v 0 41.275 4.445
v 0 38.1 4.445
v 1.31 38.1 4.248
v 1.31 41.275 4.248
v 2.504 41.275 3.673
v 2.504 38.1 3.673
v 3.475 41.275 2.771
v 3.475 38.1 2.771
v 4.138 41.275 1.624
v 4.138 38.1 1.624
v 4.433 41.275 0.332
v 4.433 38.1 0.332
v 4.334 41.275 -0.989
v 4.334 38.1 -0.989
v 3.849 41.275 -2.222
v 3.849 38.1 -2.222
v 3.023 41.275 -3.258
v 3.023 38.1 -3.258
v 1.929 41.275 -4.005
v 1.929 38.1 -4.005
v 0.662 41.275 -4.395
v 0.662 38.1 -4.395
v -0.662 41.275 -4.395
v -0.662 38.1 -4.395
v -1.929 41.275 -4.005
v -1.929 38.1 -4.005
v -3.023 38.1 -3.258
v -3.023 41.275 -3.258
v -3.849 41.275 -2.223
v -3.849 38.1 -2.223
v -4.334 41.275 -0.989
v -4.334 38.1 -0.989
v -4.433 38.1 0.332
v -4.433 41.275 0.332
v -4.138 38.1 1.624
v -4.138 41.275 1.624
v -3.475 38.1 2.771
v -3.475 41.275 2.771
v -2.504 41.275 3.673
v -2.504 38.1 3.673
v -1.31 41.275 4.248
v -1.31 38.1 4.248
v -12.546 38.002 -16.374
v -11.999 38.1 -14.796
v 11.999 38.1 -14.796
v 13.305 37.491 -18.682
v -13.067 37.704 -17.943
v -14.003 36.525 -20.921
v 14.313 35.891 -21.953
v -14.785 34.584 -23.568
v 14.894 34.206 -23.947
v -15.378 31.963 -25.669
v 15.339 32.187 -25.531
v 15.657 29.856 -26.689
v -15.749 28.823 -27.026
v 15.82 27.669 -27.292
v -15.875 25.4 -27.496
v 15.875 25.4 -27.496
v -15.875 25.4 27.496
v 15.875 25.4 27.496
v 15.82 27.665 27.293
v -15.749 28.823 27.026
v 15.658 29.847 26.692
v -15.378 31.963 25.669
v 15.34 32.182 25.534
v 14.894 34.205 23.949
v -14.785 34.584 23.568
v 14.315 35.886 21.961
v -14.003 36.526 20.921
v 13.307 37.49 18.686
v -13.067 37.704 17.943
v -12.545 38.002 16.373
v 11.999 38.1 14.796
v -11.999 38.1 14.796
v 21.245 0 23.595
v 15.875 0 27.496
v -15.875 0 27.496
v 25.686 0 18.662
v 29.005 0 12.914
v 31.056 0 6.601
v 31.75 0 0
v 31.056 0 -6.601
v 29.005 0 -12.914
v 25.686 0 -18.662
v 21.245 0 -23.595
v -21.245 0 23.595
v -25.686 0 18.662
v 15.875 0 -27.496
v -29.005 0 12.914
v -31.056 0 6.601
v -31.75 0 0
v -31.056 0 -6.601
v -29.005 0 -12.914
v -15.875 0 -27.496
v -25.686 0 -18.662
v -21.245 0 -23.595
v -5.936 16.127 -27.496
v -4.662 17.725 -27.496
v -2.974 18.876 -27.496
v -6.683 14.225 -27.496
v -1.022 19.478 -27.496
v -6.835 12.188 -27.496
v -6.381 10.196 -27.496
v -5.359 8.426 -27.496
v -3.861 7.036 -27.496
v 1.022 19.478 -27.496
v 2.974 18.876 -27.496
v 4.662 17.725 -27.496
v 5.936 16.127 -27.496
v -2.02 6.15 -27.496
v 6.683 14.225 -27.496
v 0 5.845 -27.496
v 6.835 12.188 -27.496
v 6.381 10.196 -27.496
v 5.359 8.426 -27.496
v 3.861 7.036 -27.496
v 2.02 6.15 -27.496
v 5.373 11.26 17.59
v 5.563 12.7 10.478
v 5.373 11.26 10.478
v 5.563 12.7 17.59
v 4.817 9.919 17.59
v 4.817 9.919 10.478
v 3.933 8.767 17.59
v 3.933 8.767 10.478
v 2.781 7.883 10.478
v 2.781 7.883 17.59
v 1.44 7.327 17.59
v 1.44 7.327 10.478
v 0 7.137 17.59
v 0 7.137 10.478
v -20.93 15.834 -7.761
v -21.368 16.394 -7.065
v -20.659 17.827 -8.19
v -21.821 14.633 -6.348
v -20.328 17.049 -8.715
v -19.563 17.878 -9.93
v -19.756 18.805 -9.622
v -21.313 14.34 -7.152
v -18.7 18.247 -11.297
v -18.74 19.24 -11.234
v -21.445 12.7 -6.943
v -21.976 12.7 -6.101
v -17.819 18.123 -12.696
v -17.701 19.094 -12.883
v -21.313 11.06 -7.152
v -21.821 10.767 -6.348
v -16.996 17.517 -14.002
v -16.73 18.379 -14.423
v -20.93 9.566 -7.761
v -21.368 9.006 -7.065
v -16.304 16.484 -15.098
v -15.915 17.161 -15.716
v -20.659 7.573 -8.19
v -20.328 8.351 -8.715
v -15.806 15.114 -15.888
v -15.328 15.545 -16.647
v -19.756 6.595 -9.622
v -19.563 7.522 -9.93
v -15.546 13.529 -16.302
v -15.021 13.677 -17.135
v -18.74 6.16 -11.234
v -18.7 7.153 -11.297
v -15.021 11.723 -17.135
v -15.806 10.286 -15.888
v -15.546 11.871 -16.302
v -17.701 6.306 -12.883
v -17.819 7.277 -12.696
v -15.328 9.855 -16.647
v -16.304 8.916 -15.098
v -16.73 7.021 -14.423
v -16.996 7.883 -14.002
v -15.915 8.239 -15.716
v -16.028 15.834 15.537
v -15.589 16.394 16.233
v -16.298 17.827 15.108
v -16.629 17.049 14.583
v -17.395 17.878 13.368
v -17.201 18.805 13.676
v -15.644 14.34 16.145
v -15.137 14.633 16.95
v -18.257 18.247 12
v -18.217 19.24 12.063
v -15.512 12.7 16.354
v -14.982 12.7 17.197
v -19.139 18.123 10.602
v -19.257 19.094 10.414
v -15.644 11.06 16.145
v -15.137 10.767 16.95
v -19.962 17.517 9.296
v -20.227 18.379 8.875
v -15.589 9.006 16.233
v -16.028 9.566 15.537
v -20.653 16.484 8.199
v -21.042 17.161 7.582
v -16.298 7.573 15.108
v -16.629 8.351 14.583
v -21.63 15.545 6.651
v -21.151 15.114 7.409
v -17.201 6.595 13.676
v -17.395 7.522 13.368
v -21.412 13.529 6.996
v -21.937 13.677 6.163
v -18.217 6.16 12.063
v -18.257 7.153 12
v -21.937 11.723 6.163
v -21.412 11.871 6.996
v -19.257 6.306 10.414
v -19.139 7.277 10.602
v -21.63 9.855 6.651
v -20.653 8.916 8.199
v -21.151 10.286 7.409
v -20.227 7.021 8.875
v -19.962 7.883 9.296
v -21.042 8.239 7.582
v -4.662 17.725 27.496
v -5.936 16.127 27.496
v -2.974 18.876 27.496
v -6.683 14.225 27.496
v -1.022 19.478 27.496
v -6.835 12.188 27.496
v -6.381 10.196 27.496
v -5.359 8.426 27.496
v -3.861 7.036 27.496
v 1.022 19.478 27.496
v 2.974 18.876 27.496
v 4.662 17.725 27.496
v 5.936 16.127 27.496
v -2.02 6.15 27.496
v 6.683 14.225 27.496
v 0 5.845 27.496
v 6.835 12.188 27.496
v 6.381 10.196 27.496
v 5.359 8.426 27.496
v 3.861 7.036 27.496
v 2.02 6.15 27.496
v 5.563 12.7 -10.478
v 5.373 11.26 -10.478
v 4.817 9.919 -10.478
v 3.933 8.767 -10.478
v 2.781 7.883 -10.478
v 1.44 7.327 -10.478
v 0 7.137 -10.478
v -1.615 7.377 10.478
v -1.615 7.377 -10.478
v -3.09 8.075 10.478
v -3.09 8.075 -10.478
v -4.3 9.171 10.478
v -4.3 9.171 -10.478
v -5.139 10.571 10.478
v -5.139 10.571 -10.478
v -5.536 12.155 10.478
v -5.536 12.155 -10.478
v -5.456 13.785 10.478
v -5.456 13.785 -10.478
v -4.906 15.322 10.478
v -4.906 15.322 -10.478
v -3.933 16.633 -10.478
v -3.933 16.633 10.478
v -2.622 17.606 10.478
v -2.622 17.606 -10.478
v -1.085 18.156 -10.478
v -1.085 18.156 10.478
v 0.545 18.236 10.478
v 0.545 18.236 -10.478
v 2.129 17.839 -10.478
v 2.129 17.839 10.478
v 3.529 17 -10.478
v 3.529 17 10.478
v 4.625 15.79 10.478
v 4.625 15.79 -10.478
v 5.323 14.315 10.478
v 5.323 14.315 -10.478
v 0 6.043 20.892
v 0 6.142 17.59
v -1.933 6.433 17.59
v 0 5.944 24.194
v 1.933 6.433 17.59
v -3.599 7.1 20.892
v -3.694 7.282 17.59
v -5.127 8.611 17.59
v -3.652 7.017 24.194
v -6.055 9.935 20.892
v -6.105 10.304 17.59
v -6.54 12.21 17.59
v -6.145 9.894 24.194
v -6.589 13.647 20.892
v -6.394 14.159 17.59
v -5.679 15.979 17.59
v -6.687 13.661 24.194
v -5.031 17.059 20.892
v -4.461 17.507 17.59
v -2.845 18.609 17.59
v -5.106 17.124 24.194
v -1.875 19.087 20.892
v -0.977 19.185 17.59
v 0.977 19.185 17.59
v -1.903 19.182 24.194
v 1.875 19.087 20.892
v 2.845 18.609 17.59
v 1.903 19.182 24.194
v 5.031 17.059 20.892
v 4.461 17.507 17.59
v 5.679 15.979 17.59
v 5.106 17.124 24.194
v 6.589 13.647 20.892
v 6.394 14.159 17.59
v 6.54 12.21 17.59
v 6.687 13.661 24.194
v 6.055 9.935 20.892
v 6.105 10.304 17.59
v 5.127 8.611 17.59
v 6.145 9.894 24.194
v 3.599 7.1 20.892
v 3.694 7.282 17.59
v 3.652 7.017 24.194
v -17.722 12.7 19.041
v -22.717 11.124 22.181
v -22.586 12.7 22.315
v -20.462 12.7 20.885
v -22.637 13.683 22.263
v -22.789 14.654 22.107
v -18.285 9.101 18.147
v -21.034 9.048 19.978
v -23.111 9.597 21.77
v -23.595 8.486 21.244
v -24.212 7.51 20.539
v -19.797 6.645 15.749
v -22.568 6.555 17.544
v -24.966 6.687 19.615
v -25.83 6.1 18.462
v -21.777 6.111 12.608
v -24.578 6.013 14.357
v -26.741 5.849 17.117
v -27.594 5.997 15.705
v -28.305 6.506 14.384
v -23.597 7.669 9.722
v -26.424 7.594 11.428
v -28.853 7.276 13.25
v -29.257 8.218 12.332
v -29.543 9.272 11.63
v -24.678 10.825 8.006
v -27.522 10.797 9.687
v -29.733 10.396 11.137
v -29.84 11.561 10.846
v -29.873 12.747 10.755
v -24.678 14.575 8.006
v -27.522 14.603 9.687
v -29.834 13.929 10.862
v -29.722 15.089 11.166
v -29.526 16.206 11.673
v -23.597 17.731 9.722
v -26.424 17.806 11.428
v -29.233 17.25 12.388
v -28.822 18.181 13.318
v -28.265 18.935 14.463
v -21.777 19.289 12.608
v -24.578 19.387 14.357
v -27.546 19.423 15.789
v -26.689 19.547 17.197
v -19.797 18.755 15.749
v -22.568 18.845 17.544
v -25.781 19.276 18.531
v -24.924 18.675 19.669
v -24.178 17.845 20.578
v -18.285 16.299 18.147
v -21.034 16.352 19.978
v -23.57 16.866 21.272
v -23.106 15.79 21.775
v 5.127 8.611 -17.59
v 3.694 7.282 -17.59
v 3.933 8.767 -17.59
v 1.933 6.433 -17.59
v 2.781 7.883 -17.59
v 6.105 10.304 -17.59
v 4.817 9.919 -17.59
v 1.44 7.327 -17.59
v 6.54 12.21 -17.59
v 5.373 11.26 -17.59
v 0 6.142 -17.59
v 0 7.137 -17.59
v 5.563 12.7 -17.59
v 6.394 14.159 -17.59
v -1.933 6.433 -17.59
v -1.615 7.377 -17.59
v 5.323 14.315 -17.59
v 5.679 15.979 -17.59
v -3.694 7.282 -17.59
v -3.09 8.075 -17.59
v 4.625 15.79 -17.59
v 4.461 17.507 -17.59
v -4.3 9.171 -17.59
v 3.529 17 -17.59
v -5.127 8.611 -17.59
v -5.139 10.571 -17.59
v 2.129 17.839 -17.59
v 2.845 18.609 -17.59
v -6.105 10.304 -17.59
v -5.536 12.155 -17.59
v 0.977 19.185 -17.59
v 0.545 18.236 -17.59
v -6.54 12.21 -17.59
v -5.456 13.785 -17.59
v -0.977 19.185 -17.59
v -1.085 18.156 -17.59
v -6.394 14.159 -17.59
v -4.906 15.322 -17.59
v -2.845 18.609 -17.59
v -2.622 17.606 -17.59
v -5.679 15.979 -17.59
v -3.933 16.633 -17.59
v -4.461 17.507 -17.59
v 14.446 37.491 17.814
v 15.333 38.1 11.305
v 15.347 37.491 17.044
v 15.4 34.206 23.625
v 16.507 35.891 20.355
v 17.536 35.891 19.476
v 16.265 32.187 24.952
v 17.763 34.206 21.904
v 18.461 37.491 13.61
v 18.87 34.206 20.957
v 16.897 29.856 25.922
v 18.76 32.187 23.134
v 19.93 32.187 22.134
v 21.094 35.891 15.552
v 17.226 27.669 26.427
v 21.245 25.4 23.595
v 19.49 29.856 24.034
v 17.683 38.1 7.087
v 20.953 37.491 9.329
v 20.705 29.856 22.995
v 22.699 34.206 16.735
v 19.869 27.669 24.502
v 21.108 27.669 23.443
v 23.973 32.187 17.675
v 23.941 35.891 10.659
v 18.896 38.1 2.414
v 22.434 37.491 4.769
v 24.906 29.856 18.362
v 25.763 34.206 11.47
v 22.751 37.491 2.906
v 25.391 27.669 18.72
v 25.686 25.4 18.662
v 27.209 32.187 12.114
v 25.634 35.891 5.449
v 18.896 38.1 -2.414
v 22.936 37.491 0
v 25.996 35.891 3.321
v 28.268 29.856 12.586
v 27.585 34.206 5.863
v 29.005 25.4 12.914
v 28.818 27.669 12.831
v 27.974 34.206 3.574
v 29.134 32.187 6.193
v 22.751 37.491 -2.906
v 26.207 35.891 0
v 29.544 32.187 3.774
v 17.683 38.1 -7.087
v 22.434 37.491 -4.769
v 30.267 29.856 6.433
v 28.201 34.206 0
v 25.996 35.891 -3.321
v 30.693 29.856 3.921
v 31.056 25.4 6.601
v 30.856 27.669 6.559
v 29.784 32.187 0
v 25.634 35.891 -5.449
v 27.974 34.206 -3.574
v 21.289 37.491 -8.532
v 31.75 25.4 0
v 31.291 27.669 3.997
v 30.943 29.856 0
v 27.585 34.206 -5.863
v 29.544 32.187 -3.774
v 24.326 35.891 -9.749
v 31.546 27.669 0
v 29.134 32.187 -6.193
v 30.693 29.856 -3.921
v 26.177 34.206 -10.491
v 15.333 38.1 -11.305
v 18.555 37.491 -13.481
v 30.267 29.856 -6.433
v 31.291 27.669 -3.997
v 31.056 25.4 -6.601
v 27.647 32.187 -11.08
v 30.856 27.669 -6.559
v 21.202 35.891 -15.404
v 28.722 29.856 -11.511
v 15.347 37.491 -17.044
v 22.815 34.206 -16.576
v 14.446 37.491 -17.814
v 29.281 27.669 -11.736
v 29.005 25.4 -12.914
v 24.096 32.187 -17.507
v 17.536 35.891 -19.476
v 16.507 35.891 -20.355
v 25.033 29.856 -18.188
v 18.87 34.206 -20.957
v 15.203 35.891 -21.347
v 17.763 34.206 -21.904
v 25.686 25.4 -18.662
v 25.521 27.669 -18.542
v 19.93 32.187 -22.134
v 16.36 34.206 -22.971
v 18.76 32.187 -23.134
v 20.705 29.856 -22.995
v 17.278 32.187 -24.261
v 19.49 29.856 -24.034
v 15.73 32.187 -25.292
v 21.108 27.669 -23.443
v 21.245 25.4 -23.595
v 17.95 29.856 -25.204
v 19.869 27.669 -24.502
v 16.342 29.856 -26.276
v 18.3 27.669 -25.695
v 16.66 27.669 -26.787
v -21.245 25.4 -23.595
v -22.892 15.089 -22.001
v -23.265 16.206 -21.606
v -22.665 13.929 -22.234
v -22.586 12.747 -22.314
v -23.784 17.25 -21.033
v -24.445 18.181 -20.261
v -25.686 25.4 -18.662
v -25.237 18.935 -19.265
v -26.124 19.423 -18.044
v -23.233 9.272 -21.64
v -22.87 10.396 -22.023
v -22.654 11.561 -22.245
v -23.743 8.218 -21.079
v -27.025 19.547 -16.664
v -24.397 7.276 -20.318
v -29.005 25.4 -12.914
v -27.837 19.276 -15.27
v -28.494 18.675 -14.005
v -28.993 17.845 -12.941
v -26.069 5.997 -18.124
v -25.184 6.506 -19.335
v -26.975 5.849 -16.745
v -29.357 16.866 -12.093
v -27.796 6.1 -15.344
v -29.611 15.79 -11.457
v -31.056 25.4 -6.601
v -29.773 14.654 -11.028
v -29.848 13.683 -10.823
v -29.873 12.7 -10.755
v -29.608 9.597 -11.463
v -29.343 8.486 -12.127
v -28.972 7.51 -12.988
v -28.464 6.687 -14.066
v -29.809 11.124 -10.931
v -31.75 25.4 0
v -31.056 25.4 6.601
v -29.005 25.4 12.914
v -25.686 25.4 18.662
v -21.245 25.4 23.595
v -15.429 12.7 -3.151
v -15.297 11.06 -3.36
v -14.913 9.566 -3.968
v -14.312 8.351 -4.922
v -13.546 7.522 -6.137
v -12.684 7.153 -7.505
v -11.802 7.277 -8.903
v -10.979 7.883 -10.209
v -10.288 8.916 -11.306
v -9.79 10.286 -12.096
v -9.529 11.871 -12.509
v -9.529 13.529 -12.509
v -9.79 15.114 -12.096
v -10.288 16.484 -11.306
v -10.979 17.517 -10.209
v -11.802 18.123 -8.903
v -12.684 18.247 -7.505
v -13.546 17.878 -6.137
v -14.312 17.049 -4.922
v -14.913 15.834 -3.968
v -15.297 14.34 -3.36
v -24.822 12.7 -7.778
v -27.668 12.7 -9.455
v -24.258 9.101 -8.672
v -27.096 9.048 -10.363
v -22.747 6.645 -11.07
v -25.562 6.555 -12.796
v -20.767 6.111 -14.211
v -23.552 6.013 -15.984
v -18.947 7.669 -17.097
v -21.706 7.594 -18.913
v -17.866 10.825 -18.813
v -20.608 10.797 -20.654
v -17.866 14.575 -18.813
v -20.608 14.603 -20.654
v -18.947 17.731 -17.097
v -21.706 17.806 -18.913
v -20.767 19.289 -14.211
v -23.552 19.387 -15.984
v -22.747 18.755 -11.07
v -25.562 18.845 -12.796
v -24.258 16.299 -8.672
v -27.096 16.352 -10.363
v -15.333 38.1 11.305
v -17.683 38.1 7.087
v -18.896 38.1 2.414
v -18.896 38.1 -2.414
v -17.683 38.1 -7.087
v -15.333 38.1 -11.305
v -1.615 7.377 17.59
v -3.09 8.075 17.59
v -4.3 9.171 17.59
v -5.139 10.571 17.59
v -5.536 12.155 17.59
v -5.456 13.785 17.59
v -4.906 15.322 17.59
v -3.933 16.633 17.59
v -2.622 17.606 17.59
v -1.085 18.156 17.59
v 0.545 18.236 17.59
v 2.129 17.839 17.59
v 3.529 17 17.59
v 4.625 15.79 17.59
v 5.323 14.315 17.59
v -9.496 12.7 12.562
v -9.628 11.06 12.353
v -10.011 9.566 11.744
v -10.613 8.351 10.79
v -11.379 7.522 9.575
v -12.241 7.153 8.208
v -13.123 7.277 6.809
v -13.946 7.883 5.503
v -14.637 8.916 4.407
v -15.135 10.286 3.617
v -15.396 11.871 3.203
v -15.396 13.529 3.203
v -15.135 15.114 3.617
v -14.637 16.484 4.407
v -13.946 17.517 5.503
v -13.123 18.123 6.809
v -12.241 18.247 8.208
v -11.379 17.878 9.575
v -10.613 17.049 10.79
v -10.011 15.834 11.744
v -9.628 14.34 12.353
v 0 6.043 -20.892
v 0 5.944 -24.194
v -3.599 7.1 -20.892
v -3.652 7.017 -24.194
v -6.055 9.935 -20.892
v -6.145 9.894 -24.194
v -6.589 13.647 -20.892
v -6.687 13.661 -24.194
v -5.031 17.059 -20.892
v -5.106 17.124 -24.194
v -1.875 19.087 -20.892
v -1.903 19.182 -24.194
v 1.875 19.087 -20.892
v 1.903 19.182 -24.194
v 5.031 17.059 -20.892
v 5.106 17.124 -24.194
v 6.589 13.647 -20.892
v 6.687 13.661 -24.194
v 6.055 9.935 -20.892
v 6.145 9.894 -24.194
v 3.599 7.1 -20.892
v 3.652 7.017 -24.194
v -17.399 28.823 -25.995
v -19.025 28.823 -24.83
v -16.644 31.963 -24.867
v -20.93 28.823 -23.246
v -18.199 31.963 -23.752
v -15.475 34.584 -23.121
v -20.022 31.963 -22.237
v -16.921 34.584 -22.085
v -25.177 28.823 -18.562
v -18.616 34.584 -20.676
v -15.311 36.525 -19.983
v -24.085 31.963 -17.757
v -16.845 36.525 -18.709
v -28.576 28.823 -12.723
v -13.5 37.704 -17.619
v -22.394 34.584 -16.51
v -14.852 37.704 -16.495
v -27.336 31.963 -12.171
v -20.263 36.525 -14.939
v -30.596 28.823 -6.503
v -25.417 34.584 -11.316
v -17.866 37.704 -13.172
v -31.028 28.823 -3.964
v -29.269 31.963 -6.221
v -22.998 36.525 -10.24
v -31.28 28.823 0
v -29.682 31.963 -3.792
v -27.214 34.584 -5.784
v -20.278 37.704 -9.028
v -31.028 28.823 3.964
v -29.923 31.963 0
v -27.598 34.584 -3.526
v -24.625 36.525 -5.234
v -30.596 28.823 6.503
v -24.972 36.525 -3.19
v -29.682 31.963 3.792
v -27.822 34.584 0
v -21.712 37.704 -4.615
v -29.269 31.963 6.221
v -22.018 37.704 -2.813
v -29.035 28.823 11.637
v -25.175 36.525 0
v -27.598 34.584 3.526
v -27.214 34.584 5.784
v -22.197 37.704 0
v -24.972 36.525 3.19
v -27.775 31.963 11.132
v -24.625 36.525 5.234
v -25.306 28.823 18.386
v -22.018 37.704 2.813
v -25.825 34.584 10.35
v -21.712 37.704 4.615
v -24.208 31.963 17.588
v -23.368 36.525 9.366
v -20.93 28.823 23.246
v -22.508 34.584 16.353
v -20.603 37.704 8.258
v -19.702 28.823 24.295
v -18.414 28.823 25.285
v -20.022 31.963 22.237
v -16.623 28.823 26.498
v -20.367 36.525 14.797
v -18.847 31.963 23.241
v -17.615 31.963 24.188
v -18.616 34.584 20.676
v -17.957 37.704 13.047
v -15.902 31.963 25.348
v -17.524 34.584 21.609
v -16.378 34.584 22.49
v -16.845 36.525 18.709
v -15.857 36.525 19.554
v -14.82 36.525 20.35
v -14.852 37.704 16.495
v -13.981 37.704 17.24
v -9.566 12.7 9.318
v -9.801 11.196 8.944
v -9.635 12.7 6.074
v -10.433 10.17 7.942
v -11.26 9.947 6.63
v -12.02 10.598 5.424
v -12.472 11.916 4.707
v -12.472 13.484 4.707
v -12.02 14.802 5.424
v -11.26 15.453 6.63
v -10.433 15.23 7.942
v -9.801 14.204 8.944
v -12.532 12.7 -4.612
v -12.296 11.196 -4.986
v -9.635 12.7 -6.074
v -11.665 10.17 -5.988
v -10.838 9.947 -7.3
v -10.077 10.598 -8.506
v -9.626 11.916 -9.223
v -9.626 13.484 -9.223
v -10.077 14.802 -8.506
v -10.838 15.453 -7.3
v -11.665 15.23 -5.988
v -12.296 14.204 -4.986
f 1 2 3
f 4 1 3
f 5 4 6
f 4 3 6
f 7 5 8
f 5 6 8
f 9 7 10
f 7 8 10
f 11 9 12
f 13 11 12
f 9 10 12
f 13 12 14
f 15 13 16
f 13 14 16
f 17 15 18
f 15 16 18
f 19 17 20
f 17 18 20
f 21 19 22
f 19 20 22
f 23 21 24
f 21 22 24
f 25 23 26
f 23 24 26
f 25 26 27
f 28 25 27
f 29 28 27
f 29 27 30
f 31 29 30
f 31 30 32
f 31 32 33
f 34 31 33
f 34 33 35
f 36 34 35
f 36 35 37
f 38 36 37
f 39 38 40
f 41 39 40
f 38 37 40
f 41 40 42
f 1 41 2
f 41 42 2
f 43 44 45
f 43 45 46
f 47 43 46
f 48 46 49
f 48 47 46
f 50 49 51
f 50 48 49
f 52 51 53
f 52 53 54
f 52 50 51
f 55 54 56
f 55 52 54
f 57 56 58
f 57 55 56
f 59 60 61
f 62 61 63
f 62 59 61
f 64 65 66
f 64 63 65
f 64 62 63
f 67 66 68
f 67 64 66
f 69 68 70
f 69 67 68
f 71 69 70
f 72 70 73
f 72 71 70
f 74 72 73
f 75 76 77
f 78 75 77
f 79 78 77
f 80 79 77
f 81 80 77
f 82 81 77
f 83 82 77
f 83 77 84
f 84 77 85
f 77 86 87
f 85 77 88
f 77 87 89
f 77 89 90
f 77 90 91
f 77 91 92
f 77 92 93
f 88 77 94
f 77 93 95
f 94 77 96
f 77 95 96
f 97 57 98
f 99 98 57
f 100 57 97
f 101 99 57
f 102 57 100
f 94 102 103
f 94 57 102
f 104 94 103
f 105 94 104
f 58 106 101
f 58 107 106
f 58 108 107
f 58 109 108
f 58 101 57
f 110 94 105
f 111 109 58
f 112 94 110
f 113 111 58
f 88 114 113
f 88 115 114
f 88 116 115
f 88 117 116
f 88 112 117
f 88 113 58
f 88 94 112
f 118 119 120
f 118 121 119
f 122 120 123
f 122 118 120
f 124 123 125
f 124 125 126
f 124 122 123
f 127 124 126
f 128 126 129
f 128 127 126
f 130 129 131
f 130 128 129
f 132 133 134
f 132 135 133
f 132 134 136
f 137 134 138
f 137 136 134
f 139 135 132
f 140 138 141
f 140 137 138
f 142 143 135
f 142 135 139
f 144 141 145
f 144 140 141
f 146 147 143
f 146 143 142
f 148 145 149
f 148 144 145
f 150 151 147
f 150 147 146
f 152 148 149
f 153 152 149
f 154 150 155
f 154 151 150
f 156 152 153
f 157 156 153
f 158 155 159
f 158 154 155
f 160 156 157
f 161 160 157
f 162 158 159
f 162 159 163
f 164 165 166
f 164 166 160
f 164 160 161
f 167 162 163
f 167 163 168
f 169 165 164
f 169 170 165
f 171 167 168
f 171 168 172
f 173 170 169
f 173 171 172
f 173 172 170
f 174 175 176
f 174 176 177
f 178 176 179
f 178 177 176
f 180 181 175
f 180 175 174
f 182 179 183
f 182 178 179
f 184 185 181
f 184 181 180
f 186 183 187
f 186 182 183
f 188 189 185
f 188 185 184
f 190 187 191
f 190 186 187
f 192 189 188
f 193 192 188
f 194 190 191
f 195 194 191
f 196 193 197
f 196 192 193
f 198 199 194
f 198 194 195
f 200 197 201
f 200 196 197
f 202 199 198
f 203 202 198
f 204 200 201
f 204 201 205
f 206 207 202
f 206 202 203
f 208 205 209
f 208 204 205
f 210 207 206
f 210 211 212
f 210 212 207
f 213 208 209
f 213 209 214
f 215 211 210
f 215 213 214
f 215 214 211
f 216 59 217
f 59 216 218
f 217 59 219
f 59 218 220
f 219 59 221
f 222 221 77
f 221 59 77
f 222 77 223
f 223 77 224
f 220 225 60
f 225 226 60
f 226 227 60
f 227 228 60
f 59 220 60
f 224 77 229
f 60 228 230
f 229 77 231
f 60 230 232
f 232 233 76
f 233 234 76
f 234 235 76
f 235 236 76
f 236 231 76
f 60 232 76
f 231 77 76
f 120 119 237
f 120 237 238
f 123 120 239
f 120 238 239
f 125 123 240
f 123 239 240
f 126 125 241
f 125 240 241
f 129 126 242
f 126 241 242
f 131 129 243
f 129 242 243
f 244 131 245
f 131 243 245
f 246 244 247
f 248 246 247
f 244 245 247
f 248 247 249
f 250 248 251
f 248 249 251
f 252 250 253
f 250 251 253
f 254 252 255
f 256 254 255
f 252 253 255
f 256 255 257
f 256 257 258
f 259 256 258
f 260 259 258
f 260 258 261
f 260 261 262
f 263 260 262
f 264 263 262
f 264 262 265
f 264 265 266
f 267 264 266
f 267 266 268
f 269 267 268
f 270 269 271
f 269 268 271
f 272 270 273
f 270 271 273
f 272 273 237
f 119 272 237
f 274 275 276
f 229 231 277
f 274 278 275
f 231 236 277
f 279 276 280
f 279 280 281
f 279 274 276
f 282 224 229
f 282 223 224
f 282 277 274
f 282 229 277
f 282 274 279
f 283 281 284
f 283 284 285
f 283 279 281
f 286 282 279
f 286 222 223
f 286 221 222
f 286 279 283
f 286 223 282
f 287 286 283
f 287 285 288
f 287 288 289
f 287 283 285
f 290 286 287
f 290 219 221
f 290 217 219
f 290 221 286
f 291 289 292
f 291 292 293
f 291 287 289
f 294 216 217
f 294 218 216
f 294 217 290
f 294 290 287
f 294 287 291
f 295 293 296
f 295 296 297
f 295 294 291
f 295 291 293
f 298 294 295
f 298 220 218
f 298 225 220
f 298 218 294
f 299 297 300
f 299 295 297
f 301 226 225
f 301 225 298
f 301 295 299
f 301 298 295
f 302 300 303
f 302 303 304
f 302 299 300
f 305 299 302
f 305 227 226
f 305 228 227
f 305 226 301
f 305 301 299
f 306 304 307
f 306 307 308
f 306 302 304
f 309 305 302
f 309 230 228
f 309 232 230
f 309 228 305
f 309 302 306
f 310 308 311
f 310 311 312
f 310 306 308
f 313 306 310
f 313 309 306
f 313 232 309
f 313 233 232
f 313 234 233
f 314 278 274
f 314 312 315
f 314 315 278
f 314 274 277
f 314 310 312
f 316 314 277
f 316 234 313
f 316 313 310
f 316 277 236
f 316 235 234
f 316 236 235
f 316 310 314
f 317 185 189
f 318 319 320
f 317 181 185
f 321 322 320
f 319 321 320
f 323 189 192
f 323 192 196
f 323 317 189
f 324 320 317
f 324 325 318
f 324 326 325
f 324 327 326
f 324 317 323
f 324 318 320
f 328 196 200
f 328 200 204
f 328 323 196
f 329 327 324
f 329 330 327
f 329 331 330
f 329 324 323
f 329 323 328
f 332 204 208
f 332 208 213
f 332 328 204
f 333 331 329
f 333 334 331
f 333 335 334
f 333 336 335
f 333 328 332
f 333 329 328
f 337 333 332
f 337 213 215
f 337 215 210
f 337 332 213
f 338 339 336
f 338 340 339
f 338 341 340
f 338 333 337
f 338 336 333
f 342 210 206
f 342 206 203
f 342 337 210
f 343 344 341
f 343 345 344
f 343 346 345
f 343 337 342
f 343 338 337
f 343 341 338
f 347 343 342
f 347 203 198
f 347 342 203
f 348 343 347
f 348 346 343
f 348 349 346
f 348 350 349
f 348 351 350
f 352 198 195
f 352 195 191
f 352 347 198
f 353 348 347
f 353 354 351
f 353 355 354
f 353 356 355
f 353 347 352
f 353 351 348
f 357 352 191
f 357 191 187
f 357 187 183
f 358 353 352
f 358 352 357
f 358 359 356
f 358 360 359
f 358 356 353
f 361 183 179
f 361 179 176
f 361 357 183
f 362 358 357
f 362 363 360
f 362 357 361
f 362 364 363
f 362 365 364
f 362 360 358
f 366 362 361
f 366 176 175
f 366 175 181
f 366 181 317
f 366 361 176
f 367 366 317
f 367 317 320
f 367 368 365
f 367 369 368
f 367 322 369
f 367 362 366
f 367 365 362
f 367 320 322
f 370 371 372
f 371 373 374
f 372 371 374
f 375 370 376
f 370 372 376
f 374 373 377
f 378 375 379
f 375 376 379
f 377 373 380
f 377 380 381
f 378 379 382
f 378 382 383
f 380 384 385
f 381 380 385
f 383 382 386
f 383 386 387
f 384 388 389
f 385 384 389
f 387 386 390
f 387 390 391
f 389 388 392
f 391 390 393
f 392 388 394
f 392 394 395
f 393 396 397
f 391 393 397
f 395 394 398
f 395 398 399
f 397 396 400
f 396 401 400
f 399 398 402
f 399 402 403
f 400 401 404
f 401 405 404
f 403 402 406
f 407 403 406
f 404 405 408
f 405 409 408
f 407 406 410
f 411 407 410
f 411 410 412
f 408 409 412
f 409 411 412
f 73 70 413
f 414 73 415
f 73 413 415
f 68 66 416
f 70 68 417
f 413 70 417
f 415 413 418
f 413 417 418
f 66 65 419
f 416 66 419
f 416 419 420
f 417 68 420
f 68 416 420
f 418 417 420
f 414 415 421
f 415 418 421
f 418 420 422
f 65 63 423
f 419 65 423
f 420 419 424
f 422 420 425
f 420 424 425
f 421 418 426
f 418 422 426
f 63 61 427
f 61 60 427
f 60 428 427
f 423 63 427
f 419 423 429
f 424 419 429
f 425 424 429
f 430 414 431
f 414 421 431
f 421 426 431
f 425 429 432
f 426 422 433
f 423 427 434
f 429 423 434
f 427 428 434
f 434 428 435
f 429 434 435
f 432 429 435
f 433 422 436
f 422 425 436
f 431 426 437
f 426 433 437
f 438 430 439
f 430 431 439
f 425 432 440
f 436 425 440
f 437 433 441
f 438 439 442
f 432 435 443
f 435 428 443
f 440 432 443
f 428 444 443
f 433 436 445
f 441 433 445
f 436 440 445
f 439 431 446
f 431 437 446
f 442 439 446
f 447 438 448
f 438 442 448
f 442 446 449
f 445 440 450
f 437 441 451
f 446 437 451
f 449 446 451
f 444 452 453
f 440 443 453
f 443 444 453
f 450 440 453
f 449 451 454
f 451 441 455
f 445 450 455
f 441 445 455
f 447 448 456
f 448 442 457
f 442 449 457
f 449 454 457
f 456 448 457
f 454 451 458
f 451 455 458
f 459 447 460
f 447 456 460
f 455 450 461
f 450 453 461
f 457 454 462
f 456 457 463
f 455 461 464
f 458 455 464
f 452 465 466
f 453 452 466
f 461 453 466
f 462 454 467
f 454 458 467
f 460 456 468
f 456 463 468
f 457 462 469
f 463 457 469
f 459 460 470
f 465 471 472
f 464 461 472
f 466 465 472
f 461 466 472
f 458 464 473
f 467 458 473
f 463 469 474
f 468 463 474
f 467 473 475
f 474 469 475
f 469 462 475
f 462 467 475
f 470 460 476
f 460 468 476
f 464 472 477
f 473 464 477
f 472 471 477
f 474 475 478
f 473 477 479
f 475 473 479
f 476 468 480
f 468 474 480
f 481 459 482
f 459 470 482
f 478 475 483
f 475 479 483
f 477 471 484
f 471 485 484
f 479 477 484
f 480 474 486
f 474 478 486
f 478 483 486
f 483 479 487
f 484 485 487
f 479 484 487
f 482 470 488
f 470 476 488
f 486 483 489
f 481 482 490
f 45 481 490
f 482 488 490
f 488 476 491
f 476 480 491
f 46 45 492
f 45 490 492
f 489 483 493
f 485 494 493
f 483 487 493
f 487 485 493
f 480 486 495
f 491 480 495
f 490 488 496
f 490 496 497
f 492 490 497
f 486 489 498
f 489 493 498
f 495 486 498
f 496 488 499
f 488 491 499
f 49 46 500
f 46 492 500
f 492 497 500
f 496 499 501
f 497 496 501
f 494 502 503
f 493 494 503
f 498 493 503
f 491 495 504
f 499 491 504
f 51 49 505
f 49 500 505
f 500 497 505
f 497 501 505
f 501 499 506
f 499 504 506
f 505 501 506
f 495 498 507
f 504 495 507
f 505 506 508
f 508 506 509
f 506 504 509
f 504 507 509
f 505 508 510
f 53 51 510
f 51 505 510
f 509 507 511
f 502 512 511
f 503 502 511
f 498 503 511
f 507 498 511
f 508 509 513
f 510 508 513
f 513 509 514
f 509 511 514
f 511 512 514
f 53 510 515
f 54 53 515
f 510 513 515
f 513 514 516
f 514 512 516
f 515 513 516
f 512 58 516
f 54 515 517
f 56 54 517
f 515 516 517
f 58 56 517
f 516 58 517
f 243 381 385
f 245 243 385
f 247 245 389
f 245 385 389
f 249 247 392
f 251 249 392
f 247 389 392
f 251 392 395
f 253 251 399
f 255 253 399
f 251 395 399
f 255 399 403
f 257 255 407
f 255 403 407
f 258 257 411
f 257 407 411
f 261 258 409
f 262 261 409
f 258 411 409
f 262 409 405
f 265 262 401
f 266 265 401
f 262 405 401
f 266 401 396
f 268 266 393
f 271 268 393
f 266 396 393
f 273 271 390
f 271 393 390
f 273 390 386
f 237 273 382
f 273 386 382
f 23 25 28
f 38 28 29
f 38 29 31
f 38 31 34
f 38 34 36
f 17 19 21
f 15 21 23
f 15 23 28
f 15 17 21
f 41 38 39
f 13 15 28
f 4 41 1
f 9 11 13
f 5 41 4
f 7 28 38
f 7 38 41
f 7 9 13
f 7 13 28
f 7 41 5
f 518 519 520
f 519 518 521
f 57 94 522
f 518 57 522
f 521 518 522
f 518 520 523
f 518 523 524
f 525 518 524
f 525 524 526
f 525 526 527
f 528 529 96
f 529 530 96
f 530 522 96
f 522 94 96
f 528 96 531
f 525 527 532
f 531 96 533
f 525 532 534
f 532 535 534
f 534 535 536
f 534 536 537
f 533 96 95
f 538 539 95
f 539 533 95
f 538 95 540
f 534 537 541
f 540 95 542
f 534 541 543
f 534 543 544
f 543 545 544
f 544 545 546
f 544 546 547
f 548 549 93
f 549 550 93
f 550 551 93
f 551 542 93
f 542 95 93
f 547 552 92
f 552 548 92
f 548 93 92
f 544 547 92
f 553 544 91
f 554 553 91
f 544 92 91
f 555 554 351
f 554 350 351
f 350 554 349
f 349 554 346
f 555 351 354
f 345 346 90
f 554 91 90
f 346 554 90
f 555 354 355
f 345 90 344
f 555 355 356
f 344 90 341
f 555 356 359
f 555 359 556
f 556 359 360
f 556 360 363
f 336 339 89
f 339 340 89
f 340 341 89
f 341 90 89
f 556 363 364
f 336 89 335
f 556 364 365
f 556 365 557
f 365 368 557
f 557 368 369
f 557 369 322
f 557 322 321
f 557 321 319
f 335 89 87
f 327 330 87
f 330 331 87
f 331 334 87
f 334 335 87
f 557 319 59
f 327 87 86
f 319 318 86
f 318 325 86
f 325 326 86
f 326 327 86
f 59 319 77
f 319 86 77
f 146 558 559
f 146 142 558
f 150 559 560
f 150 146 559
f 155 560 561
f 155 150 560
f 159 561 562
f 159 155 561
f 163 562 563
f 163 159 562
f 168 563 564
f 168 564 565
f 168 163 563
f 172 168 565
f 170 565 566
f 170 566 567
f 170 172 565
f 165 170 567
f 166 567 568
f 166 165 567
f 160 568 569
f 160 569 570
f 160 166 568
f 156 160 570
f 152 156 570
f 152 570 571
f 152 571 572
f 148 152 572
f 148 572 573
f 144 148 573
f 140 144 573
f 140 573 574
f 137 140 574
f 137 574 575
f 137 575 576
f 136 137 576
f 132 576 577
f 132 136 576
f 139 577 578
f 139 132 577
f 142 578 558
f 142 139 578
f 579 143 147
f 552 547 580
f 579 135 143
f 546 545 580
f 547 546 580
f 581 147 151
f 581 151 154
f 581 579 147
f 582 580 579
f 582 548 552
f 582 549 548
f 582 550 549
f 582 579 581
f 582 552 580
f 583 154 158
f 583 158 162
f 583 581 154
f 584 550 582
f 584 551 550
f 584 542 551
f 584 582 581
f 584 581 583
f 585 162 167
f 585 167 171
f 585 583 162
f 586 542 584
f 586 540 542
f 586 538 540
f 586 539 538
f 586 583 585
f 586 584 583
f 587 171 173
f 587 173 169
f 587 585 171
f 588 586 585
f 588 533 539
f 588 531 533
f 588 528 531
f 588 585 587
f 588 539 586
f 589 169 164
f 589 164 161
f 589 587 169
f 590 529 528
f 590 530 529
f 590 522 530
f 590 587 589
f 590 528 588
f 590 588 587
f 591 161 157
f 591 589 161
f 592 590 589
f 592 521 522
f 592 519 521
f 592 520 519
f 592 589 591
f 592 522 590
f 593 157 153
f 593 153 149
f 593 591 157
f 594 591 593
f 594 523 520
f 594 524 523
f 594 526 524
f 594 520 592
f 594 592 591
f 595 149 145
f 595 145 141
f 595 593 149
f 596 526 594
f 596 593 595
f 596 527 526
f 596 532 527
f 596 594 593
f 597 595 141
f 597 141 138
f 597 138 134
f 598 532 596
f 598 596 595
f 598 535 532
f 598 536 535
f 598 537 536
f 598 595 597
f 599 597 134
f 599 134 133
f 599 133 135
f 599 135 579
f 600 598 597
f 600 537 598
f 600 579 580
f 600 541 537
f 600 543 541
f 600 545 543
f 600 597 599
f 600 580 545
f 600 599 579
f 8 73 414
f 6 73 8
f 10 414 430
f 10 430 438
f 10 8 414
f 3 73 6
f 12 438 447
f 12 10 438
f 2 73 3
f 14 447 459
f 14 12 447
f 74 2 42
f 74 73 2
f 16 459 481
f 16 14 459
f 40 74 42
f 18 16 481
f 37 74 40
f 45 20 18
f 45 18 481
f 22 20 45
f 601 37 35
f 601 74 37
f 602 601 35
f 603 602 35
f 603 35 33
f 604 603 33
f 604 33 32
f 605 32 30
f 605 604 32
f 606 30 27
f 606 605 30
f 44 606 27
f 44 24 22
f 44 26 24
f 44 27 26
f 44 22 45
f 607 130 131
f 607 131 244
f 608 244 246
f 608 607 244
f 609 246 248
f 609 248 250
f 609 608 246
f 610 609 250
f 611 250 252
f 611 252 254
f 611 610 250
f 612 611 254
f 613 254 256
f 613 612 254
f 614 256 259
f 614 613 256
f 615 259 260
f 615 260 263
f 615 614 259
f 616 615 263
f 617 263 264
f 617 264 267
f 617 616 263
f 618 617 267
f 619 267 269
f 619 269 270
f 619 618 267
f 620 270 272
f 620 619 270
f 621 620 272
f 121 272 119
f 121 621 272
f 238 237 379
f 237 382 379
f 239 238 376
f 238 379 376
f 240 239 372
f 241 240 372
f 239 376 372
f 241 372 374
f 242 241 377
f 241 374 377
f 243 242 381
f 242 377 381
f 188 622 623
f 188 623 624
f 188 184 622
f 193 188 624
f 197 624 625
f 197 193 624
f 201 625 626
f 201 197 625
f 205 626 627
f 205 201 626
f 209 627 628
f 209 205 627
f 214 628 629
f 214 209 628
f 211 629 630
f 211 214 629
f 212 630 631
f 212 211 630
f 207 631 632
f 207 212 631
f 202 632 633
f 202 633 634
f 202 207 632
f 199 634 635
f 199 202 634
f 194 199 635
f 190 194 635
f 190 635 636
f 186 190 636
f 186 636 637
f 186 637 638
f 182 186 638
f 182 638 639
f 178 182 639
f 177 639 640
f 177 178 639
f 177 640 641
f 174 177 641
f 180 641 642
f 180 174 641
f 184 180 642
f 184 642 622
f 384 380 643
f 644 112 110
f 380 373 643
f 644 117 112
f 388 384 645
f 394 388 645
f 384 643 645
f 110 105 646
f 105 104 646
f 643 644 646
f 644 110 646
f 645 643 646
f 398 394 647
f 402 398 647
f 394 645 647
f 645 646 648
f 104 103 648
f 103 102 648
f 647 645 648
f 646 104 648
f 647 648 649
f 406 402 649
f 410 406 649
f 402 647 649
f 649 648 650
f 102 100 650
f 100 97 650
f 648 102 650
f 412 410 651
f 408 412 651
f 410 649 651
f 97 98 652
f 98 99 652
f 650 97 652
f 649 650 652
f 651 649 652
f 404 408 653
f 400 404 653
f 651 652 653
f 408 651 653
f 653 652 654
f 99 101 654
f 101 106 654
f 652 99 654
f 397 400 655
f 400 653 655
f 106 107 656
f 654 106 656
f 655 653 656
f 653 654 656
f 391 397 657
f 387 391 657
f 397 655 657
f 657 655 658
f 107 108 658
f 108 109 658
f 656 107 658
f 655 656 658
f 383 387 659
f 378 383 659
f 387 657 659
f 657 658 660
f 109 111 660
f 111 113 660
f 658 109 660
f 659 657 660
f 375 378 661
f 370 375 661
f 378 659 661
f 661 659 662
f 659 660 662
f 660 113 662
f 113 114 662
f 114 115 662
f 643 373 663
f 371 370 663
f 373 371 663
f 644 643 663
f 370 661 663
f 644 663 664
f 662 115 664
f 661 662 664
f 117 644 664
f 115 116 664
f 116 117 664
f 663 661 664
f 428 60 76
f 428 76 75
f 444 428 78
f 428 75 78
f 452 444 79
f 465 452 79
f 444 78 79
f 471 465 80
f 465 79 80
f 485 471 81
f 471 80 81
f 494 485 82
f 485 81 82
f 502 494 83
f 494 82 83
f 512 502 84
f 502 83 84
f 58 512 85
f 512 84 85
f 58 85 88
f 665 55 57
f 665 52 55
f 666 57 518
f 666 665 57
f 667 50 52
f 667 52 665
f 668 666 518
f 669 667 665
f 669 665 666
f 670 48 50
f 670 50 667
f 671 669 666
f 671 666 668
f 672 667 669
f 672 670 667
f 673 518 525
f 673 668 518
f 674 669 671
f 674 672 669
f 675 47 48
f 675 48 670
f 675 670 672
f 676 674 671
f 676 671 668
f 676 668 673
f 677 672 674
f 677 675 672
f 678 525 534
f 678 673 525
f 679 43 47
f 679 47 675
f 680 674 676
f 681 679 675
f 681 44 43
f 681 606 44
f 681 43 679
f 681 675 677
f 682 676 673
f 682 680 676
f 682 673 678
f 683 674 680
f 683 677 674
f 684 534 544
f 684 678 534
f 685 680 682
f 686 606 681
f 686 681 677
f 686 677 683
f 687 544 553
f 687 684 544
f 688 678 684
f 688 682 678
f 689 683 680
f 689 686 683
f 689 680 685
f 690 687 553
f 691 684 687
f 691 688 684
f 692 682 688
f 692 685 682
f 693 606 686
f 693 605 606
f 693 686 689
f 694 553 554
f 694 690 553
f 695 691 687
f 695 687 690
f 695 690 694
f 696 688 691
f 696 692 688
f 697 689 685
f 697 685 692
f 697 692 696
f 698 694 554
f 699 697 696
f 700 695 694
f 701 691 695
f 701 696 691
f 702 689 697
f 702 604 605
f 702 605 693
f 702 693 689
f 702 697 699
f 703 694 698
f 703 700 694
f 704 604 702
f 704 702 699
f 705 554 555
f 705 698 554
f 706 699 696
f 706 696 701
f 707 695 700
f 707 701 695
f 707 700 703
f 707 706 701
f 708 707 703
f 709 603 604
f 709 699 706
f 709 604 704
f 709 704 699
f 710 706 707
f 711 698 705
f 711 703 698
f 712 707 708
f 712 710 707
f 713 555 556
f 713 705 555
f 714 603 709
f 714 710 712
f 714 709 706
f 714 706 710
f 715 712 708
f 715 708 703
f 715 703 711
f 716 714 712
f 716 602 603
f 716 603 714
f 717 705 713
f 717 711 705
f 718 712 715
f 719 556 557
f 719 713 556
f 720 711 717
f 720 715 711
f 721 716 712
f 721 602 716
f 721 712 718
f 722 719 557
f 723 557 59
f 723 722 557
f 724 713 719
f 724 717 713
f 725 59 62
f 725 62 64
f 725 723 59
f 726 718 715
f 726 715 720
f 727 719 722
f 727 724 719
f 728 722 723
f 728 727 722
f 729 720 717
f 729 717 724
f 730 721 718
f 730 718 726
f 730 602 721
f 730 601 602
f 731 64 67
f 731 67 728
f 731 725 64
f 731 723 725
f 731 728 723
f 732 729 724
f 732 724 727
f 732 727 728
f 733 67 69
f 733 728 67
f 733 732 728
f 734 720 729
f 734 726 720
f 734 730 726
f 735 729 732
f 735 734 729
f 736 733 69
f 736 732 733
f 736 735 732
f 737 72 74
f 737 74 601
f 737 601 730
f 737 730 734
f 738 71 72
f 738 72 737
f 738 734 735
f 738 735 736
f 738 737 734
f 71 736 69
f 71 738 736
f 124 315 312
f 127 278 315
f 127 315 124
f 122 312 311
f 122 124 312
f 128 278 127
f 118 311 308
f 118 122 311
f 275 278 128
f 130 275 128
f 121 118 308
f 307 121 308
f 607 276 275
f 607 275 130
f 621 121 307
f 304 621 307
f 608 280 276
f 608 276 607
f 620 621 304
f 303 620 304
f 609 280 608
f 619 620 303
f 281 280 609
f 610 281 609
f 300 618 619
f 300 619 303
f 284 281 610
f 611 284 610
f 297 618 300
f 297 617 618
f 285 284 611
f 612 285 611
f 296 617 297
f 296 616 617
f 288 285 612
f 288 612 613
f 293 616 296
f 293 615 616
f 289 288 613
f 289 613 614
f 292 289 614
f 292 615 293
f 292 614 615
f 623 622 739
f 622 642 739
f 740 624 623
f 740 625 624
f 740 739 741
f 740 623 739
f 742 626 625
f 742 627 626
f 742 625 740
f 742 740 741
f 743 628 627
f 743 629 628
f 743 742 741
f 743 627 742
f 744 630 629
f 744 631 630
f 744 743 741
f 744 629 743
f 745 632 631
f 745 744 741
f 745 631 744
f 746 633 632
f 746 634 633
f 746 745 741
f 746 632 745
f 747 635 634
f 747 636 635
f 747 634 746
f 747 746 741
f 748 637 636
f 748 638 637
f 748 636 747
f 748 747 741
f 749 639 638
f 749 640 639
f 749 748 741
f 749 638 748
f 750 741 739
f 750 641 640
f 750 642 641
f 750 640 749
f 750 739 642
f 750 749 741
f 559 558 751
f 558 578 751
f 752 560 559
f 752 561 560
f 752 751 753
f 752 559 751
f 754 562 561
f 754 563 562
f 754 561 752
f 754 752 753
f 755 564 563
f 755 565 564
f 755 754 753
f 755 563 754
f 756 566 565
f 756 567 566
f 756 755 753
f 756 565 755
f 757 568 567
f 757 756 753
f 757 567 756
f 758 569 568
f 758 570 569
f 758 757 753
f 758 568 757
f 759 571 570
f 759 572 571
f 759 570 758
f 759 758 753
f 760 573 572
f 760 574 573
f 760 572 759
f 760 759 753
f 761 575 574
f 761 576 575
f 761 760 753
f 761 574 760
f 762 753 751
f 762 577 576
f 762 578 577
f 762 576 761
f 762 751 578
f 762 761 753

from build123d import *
from build123d.topology import SkipClean

# Parameters (mm, degrees)
SKETCH1_R           = 31.75
BOSS_EXTRUDE1_DEPTH = 38.1
CUT_EXTRUDE1_DEPTH  = 59.887477446
FILLET1_R           = 12.7
SKETCH7_R           = 5.5626
CUT_EXTRUDE2_DEPTH  = 75.053089233
SKETCH8_R           = 4.445
BOSS_EXTRUDE2_DEPTH = 3.175


with BuildPart() as part:
    # Sketch1 → Boss-Extrude1 (new body)
    with BuildSketch(Plane(origin=(0, 0, 0), x_dir=(1, 0, 0), z_dir=(0, 1, 0))):
        with Locations(Location((0, 0, 0), (0, 0, 90))):
            Circle(SKETCH1_R)
    extrude(amount=BOSS_EXTRUDE1_DEPTH)

    # Sketch2 → Cut-Extrude1 (cut, through all)
    with BuildSketch(Plane.XZ):
        with BuildLine():
            Line((-15.875, 27.49630657), (15.875, 27.49630657))
            ThreePointArc((15.875, 27.49630657), (0, 31.75), (-15.875, 27.49630657))
        make_face()
        with BuildLine():
            Line((-15.875, -27.49630657), (15.875, -27.49630657))
            ThreePointArc((15.875, -27.49630657), (0, -31.75), (-15.875, -27.49630657))
        make_face()
    extrude(amount=-CUT_EXTRUDE1_DEPTH, mode=Mode.SUBTRACT)

    # Fillet1
    fillet1_edges = [part.edges().sort_by_distance(p)[0] for p in [
        (-31.75, 38.1, 0),
        (0, 38.1, -27.49630657),
        (31.75, 38.1, 0),
        (0, 38.1, 27.49630657),
    ]]
    fillet(fillet1_edges, radius=FILLET1_R)

    # Sketch4 → 1/4 NPT Tapped Hole1 (revolve, cut)
    with BuildSketch(Plane(origin=(0, 12.7, 27.49630657), x_dir=(0, -1, 0), z_dir=(1, 0, 0))):
        Polygon((0, 0), (0, 20.360347279), (5.5626, 17.018), (5.5626, 9.906), (6.557984794, 9.906), (6.8545837, 0), align=None)
    f_1_4_npt_tapped_hole1 = revolve(axis=Axis((0, 12.7, 33.84630657), (0, 0, -1)), mode=Mode.SUBTRACT)

    # Mirror1: 1/4 NPT Tapped Hole1 across plane
    add(f_1_4_npt_tapped_hole1.mirror(Plane.XY), mode=Mode.SUBTRACT)

    # Sketch6 → 1/4 NPT Tapped Hole2 (revolve, cut)
    with BuildSketch(Plane(origin=(-26.85868109, 12.7, 16.931442647), x_dir=(0.5332737841578493, 0, 0.8459427114940868), z_dir=(0, 1, 0))):
        Polygon((0, 0), (0, 20.360347279), (5.5626, 17.018), (5.5626, 9.906), (6.557984794, 9.906), (6.8545837, 0), align=None)
    revolve(axis=Axis((-32.230417308, 12.7, 20.317731176), (0.8459427114940866, 0, -0.5332737841578492)), mode=Mode.SUBTRACT)

    # Sketch6 at point 2 (carried to point 2, square into its face) → 1/4 NPT Tapped Hole2 at 2 (revolve, cut)
    with BuildSketch(Plane(origin=(-26.85868109, 12.7, -16.931442647), x_dir=(-0.533273808, 0, 0.845942696), z_dir=(0, 1, 0))):
        Polygon((0, 0), (0, 20.360347279), (5.5626, 17.018), (5.5626, 9.906), (6.557984794, 9.906), (6.8545837, 0), align=None)
    revolve(axis=Axis((-32.230417211, 12.7, -20.317731331), (0.845942696, 0, 0.533273808)), mode=Mode.SUBTRACT)

    # Sketch7 → Cut-Extrude2 (cut, through all)
    with SkipClean():  # the faces are left unmerged after this step: merging them gives an invalid solid
        with BuildSketch(Plane(origin=(0, 0, -27.49630657), x_dir=(-1, 0, 0), z_dir=(0, 0, -1))):
            with Locations(Location((0, 12.7, 0), (0, 0, 180))):
                Circle(SKETCH7_R)
        extrude(amount=-CUT_EXTRUDE2_DEPTH, mode=Mode.SUBTRACT)

    # Sketch8 → Boss-Extrude2 (add)
    with SkipClean():  # the faces are left unmerged after this step: merging them gives an invalid solid
        with BuildSketch(Plane(origin=(0, 38.1, 0), x_dir=(1, 0, 0), z_dir=(0, 1, 0))):
            with Locations(Location((0, 0, 0), (0, 0, 270))):
                Circle(SKETCH8_R)
        extrude(amount=BOSS_EXTRUDE2_DEPTH)


solid = part.part
